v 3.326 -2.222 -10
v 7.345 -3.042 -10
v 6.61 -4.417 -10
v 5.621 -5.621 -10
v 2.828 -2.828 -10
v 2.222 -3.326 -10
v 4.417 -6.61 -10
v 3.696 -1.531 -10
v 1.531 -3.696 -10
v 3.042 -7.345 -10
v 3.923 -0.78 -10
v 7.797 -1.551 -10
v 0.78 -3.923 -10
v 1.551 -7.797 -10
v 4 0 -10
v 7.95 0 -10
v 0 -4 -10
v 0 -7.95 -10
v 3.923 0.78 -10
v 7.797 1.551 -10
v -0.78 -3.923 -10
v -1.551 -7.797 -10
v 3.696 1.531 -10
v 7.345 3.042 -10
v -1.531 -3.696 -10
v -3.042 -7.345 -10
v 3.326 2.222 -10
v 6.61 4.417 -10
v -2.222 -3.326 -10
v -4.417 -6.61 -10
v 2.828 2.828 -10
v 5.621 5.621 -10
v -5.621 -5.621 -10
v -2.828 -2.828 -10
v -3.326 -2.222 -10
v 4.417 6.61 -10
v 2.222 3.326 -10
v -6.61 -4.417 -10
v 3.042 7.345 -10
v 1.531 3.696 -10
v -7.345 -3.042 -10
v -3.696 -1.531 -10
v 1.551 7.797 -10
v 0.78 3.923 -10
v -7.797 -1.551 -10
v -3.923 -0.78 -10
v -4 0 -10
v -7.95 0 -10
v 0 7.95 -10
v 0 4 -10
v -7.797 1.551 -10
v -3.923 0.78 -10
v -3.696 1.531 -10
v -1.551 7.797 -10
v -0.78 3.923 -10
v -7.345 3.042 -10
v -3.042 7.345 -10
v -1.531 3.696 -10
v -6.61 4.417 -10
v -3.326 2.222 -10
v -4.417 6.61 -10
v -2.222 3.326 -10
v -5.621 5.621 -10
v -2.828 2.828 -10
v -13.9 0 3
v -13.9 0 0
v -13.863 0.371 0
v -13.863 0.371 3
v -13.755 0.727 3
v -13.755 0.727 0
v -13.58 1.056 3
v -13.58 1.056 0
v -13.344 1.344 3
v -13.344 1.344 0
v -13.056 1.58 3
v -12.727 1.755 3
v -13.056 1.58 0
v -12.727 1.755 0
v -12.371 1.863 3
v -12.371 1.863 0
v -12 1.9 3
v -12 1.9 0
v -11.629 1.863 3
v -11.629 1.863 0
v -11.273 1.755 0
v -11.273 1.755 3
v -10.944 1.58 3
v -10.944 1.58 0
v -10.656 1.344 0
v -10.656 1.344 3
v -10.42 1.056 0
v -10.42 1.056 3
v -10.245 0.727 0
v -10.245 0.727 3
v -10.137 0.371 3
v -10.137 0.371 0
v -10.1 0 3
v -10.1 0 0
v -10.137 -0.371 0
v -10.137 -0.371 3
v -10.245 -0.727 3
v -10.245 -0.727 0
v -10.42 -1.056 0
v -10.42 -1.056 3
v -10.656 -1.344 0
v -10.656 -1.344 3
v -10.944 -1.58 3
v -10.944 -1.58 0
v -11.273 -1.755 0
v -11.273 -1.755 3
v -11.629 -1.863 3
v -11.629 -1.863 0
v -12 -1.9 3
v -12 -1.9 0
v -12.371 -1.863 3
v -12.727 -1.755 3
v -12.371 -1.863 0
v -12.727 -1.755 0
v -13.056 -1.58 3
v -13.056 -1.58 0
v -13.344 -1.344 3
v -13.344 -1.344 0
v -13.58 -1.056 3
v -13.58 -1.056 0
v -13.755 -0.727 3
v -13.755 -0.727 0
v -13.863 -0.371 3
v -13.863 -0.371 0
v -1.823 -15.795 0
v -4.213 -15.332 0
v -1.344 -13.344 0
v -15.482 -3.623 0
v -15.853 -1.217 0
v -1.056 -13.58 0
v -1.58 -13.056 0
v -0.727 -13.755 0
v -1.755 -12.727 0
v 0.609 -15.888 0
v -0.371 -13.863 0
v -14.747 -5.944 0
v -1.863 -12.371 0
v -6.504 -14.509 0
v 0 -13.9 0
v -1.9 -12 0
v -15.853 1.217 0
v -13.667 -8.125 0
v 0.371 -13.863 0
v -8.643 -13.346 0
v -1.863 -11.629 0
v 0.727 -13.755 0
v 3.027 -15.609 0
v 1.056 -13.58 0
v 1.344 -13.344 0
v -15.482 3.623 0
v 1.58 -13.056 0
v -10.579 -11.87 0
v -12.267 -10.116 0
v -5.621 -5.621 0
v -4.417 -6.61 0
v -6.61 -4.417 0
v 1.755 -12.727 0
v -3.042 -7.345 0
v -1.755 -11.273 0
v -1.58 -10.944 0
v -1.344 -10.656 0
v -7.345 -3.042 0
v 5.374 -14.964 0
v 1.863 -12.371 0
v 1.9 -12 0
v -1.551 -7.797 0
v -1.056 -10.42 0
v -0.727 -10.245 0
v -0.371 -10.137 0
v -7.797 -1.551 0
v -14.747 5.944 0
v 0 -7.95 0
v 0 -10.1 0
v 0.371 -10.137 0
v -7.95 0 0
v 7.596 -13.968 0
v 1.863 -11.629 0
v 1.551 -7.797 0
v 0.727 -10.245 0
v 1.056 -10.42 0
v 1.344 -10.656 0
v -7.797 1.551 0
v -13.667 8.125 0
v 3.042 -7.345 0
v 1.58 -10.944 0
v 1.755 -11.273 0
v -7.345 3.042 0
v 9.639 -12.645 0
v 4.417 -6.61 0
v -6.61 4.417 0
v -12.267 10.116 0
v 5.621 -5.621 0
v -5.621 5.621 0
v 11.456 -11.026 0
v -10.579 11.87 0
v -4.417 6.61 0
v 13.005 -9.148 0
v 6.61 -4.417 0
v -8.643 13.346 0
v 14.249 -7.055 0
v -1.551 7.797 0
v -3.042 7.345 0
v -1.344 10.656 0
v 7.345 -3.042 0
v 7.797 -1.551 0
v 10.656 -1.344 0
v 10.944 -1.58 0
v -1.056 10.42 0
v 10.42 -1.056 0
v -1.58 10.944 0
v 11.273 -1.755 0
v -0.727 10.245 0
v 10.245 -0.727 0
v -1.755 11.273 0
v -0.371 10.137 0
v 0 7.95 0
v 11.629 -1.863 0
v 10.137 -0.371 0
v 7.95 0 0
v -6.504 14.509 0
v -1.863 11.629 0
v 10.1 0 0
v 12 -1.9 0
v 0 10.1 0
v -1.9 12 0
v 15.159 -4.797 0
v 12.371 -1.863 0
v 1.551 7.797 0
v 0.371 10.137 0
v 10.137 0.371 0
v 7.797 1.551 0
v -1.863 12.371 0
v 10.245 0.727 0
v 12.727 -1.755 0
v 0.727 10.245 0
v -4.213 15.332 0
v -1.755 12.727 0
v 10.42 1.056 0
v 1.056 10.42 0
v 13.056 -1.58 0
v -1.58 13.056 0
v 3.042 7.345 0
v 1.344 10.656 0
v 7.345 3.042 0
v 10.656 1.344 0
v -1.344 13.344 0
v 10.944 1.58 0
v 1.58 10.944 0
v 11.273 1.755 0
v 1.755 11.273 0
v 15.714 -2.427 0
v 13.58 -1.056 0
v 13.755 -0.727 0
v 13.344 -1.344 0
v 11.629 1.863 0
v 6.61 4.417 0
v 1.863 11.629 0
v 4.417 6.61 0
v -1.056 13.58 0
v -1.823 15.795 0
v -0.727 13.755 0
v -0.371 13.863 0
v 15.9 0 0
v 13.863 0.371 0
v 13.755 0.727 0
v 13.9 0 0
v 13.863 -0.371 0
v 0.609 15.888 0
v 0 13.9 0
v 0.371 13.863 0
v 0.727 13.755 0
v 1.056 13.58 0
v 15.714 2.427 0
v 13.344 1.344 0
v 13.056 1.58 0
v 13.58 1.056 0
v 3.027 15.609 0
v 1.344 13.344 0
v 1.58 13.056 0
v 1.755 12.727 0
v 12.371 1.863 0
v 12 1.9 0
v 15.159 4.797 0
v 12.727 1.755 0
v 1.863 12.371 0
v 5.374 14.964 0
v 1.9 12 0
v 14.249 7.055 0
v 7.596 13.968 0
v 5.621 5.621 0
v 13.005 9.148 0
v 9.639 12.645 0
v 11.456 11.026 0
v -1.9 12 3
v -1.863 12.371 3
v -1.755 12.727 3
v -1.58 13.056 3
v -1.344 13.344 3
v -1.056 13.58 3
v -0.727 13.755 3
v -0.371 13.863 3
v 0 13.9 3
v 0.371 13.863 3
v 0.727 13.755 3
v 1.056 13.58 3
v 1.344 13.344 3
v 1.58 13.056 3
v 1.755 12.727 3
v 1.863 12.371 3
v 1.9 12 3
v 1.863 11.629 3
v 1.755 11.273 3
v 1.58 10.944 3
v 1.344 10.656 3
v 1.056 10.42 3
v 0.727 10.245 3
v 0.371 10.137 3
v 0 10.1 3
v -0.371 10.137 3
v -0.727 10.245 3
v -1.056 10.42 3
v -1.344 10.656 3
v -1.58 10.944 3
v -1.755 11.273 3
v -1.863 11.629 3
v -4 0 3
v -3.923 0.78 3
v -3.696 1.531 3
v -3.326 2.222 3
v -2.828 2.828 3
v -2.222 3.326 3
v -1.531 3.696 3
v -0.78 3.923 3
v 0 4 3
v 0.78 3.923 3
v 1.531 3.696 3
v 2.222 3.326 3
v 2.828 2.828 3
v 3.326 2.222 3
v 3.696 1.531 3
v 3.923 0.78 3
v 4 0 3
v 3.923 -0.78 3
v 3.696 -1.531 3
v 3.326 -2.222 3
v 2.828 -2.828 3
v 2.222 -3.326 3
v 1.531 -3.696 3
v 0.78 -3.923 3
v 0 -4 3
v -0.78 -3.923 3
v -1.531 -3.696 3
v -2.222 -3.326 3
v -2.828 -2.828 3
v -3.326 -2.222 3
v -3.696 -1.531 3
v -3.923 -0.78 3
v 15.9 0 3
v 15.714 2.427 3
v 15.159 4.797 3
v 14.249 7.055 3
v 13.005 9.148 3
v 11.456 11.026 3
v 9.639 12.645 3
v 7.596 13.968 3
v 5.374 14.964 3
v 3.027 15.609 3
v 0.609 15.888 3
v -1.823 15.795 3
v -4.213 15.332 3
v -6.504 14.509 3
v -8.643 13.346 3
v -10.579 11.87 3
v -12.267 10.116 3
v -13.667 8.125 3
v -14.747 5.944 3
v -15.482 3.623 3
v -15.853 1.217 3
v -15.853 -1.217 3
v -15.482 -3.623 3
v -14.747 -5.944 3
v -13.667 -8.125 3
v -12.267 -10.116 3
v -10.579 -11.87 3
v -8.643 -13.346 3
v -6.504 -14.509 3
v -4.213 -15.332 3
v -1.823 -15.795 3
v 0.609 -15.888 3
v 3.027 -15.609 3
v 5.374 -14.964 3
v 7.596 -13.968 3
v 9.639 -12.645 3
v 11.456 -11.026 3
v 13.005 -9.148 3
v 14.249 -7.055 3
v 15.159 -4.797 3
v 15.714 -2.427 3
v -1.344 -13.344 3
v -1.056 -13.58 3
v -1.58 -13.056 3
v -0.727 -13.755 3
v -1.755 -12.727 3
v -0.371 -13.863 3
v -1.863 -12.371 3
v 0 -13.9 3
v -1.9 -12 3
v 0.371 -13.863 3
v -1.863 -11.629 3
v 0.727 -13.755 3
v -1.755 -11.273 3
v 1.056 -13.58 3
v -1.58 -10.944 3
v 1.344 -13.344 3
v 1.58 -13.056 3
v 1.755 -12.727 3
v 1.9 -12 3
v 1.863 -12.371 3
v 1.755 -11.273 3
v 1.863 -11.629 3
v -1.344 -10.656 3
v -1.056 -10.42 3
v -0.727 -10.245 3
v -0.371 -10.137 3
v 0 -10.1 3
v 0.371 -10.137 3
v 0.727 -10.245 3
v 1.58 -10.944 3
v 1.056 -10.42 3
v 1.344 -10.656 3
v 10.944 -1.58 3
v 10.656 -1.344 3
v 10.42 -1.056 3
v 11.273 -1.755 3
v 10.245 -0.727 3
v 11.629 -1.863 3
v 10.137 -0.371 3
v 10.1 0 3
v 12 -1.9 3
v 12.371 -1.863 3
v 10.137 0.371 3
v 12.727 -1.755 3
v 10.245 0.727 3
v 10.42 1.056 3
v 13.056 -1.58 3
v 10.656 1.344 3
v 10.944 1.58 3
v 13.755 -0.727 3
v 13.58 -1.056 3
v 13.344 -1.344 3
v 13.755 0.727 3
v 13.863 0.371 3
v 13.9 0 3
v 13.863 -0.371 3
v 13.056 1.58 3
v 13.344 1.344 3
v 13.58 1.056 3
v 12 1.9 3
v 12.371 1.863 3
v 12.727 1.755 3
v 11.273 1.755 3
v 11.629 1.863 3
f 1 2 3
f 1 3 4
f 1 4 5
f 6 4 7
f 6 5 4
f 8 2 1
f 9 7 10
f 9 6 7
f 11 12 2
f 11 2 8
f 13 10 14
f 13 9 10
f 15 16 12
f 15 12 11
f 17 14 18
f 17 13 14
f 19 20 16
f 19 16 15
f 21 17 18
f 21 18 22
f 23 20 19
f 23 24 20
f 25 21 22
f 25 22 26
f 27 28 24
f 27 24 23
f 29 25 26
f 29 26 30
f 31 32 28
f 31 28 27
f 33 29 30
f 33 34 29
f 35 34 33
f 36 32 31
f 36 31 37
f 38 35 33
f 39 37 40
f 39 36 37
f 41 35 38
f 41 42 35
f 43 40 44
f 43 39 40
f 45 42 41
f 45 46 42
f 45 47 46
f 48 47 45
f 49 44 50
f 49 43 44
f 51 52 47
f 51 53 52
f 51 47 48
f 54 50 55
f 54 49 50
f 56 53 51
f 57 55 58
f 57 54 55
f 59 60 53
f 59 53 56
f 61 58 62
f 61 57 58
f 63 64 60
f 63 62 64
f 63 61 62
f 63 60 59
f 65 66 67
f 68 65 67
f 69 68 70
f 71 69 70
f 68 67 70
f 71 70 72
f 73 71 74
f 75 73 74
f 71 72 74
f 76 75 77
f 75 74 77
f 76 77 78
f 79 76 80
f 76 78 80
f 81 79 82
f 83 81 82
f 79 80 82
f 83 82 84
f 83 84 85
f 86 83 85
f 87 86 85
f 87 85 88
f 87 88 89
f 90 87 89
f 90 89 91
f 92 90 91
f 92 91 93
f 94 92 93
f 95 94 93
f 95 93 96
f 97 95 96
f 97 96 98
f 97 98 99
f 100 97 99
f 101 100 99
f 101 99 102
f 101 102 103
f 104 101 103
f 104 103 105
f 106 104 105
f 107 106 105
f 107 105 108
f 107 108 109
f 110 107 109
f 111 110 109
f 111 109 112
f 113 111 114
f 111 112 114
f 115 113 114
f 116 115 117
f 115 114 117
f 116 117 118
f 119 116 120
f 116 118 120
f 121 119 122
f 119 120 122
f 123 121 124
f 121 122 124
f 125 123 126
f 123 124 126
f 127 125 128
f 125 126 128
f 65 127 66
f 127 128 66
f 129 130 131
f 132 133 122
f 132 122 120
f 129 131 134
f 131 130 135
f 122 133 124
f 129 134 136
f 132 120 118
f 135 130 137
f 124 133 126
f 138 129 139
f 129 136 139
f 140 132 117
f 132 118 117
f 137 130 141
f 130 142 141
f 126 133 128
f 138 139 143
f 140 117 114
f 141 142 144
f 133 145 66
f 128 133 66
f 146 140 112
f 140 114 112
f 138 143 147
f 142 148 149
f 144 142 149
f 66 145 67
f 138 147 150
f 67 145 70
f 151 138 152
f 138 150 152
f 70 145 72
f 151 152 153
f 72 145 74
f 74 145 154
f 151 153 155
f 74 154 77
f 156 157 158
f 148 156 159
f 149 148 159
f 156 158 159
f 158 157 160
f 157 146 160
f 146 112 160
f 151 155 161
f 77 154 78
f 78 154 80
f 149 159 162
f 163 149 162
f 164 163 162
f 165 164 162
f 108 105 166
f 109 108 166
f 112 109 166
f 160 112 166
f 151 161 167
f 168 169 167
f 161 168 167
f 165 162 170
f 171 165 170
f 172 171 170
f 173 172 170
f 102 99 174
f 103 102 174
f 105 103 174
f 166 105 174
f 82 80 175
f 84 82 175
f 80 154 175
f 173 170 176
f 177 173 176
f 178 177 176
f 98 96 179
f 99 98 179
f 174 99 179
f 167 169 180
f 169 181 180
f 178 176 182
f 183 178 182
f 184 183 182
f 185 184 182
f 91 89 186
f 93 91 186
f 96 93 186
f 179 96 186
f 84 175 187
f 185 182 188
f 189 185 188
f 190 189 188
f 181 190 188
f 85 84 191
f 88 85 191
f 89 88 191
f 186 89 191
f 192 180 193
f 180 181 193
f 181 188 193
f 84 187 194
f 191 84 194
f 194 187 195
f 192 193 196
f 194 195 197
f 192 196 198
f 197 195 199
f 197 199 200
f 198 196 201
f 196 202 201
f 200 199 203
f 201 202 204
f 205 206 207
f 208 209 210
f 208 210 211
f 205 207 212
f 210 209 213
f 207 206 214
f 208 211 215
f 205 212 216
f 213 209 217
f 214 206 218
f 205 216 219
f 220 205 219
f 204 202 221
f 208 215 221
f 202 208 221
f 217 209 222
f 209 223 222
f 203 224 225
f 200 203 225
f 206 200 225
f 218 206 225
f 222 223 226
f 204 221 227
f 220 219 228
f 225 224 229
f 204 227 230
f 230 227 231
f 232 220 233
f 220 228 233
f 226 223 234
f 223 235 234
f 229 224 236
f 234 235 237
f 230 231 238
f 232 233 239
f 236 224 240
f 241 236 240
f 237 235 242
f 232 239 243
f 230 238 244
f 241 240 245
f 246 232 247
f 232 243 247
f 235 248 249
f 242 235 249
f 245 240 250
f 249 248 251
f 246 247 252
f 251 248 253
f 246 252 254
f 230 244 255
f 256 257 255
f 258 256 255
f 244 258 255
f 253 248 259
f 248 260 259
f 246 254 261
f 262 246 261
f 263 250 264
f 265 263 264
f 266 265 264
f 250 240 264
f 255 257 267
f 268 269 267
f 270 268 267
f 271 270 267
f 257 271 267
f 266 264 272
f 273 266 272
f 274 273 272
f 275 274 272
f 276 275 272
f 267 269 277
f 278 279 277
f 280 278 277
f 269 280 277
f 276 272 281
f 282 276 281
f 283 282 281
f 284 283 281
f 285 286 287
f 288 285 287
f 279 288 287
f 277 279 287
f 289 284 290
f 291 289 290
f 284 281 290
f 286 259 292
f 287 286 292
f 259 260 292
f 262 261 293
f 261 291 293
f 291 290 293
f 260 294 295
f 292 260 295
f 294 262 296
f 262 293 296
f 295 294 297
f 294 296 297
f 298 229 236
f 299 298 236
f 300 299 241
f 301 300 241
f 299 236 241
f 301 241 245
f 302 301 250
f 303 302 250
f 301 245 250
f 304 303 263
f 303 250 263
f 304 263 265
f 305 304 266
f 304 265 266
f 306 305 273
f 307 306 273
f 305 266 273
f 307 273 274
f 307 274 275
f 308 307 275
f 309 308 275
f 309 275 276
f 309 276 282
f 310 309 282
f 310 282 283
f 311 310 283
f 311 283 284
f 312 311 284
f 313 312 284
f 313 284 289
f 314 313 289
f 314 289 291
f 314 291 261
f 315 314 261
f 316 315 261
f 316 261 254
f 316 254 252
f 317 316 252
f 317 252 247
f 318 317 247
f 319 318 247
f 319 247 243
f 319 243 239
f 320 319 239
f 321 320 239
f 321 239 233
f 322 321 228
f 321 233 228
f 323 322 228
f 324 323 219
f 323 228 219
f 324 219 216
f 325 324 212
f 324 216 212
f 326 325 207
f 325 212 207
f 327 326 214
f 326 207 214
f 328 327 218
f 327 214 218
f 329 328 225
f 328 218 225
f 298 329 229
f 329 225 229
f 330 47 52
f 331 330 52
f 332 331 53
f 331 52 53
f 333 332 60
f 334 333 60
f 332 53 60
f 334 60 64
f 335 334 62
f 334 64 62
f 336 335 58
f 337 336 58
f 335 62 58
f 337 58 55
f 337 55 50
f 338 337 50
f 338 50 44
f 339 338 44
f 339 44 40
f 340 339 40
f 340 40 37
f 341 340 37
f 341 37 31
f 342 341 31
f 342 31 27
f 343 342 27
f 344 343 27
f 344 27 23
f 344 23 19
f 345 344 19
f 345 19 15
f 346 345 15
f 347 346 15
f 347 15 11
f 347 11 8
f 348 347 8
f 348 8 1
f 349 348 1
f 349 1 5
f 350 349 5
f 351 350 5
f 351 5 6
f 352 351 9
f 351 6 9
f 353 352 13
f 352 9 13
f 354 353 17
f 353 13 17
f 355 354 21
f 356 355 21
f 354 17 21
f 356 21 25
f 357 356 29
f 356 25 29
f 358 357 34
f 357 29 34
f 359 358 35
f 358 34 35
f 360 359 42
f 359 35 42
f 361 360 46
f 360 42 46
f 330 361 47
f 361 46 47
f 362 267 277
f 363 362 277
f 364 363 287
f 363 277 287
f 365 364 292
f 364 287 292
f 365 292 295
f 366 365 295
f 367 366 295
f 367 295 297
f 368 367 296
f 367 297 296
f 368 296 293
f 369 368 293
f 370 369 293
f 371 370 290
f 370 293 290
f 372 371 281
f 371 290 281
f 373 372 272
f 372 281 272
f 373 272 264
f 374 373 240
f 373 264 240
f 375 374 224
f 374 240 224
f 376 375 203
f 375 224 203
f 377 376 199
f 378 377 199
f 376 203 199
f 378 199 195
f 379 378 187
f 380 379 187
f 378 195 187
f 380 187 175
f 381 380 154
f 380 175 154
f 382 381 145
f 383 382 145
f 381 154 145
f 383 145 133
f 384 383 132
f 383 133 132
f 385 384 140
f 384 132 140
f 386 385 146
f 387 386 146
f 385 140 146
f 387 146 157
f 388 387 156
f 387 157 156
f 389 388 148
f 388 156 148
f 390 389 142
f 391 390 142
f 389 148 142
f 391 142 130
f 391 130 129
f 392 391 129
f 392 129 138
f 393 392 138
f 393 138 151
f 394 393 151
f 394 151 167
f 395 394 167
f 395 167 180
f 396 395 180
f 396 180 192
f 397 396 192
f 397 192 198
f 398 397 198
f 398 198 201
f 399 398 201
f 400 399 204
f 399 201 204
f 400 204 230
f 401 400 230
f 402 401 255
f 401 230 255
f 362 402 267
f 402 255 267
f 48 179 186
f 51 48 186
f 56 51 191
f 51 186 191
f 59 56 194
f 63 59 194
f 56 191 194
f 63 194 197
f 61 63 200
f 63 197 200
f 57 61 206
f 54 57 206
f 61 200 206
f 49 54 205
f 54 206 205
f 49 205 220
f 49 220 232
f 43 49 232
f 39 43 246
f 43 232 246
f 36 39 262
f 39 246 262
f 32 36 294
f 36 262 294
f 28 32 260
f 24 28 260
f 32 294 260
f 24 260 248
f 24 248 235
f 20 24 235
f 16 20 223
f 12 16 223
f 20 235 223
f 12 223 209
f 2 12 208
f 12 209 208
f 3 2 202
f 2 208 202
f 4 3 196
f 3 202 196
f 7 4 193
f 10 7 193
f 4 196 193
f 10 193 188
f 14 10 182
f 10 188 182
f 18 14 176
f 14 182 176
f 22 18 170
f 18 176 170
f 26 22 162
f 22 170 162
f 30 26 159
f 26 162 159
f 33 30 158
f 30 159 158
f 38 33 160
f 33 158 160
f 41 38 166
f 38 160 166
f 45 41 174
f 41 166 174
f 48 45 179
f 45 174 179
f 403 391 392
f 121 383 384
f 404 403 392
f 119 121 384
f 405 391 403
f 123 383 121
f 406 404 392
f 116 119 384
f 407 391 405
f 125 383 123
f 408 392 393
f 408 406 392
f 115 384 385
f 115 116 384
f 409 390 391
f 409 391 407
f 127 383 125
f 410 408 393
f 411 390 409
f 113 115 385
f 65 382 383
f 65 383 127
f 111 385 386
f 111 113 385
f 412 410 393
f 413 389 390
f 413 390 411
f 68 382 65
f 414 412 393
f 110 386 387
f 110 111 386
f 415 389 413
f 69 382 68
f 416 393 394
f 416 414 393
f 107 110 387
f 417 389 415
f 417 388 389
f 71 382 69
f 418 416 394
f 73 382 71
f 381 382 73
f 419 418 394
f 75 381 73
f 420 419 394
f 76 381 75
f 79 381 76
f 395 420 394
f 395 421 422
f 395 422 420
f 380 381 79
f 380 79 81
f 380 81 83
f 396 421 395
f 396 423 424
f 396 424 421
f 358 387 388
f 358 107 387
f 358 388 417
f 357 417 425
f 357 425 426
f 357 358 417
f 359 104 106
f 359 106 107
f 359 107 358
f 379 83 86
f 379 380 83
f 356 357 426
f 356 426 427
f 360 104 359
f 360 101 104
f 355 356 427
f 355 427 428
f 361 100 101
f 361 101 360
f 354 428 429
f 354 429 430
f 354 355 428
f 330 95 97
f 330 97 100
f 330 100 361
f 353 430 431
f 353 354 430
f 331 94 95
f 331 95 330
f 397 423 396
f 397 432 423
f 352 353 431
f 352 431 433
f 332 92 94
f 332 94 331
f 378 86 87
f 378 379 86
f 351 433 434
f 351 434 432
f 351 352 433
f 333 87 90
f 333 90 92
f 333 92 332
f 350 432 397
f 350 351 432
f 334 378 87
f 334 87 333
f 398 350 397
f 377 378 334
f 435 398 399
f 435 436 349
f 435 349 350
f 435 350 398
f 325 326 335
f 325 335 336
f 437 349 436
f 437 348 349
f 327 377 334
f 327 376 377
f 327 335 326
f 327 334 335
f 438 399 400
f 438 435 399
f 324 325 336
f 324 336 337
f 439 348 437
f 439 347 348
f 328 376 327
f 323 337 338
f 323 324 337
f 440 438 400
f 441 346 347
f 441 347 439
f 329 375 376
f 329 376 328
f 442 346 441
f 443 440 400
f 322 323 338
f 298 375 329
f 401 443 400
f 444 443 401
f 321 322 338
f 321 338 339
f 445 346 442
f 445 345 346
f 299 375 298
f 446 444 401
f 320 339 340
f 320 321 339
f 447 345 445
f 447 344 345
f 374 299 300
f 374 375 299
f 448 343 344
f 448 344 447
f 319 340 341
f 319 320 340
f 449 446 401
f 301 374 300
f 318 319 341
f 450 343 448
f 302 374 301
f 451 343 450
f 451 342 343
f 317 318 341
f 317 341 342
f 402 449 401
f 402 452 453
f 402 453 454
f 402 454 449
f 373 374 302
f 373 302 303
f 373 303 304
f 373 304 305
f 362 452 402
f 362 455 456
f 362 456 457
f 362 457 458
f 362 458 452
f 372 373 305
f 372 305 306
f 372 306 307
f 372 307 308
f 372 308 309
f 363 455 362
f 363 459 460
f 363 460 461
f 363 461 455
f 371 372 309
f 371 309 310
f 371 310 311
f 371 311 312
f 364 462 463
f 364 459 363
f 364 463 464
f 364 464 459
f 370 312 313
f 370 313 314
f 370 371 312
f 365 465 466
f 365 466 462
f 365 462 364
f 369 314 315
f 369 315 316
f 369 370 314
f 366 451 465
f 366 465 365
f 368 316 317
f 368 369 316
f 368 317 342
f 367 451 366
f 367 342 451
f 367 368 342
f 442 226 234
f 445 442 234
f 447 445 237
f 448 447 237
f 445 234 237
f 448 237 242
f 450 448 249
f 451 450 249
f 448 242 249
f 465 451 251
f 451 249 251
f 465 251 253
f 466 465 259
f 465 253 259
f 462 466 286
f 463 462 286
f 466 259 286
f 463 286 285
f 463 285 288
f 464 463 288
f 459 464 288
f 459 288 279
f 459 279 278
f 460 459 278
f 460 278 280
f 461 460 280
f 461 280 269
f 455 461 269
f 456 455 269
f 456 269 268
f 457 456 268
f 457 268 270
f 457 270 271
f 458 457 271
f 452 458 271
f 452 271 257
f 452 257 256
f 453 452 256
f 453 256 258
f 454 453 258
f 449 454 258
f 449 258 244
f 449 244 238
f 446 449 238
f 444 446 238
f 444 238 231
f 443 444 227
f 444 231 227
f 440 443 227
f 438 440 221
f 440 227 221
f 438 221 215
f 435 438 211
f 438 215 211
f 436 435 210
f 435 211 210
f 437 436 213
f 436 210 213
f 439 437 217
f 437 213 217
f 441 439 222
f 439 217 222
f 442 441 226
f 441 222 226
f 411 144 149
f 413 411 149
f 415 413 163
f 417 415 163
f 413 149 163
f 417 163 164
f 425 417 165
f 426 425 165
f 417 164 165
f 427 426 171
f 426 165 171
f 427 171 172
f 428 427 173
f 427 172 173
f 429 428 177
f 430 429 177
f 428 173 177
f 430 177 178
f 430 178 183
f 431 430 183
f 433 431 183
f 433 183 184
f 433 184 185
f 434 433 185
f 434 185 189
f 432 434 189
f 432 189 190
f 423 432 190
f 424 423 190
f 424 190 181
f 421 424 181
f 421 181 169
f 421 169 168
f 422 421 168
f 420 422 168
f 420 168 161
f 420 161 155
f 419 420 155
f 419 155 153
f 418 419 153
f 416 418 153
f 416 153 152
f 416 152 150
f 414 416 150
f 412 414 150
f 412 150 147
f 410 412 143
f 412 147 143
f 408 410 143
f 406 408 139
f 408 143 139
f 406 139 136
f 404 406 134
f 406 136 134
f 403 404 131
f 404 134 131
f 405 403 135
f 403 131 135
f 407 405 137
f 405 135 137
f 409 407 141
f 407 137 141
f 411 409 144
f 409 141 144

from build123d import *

# Parameters (mm, degrees)
SKETCH1_R           = 15.9
BOSS_EXTRUDE1_DEPTH = 3
SKETCH2_R           = 7.95
BOSS_EXTRUDE2_DEPTH = 10
SKETCH3_R           = 4
CUT_EXTRUDE1_DEPTH  = 20
SKETCH4_R           = 1.9
CUT_EXTRUDE2_DEPTH  = 20


with BuildPart() as part:
    # Sketch1 → Boss-Extrude1 (new body)
    with BuildSketch(Plane.XY):
        Circle(SKETCH1_R)
    extrude(amount=BOSS_EXTRUDE1_DEPTH)

    # Sketch2 → Boss-Extrude2 (add)
    with BuildSketch(Plane(origin=(0, 0, 0), x_dir=(-1, 0, 0), z_dir=(0, 0, -1))):
        Circle(SKETCH2_R)
    extrude(amount=BOSS_EXTRUDE2_DEPTH)

    # Sketch3 → Cut-Extrude1 (cut)
    with BuildSketch(Plane(origin=(0, 0, -10), x_dir=(-1, 0, 0), z_dir=(0, 0, -1))):
        Circle(SKETCH3_R)
    extrude(amount=-CUT_EXTRUDE1_DEPTH, mode=Mode.SUBTRACT)

    # Sketch4 → Cut-Extrude2 (cut)
    with BuildSketch(Plane(origin=(0, 0, 0), x_dir=(-1, 0, 0), z_dir=(0, 0, -1))):
        with Locations((0, 12)):
            Circle(SKETCH4_R)
        with Locations((-12, 0)):
            Circle(SKETCH4_R)
        with Locations((12, 0)):
            Circle(SKETCH4_R)
        with Locations((0, -12)):
            Circle(SKETCH4_R)
    extrude(amount=-CUT_EXTRUDE2_DEPTH, mode=Mode.SUBTRACT)


solid = part.part
